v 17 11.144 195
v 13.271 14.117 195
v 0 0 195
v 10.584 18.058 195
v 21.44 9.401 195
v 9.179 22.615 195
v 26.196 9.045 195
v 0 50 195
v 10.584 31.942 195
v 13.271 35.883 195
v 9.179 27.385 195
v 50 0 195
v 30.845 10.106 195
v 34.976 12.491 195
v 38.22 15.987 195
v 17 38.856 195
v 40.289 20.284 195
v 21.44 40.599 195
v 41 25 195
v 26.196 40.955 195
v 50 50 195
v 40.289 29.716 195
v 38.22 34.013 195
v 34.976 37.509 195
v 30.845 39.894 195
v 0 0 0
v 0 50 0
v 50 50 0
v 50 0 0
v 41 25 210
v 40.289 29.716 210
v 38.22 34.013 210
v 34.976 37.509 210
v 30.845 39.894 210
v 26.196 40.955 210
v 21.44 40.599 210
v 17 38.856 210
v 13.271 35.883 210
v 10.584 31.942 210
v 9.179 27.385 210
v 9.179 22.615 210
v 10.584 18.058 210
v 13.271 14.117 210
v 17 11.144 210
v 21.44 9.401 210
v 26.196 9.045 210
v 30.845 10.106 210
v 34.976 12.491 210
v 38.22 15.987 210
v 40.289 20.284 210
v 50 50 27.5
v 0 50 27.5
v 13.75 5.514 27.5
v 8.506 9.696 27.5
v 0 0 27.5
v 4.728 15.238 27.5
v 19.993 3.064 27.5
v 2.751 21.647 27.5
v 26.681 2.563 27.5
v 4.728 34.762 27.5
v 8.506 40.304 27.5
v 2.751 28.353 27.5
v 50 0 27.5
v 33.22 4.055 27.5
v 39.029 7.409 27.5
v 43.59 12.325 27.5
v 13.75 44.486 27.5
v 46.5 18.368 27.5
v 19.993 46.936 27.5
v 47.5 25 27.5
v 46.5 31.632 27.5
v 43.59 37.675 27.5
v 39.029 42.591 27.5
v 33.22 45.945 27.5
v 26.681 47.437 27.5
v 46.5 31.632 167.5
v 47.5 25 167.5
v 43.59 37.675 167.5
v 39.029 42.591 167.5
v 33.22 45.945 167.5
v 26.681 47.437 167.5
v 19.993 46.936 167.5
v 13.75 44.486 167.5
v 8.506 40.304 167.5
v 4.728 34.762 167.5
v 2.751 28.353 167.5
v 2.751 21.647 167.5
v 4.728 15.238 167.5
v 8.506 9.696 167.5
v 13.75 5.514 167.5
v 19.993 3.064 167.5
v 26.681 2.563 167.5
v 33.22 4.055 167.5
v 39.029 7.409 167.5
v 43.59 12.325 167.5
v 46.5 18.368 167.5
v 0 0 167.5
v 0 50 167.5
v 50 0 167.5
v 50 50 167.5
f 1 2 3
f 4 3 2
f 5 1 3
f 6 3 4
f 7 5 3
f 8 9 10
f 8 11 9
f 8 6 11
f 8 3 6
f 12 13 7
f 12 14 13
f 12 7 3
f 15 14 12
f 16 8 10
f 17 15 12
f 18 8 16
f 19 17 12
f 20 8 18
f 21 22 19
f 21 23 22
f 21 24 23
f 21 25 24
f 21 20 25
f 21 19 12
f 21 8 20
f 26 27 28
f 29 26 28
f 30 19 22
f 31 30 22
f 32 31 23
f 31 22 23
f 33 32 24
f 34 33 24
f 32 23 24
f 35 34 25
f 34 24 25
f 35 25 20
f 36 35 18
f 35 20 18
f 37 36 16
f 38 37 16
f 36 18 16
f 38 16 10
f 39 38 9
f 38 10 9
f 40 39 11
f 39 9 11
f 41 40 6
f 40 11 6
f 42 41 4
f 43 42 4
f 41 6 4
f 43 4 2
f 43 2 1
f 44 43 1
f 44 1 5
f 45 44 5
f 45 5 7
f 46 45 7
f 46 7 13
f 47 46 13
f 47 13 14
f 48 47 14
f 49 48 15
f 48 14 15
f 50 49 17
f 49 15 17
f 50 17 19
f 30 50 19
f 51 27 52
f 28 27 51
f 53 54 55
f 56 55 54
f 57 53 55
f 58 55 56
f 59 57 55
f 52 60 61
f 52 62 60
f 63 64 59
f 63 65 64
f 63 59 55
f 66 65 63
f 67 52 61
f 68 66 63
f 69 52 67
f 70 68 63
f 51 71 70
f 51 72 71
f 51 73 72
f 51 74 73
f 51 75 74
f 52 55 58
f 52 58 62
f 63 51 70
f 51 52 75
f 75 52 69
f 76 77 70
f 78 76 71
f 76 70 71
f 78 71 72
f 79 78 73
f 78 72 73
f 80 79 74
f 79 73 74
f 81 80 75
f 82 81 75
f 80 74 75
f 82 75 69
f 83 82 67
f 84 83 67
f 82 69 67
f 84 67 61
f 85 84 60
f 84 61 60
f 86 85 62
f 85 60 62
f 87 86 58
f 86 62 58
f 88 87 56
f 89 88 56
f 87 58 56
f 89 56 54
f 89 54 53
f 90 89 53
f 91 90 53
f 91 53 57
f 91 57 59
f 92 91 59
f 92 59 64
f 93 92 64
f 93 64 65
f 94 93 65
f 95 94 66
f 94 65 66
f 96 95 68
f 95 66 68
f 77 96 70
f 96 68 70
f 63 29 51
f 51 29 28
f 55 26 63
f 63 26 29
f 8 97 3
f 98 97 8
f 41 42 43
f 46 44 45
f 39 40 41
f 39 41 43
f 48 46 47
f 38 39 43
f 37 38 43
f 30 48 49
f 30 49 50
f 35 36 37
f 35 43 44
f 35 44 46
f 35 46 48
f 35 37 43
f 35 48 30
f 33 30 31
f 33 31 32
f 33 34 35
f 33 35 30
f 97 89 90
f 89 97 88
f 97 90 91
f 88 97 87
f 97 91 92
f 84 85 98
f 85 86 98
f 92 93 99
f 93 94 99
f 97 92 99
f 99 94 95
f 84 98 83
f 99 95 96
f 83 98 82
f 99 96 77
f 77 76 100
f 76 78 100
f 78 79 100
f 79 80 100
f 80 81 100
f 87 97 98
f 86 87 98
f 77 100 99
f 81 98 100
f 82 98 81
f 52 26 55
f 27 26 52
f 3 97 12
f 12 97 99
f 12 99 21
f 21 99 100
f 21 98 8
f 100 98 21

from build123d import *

# Parameters (mm, degrees)
SKETCH1_W           = 50
SKETCH1_H           = 50
BOSS_EXTRUDE1_DEPTH = 27.5
SKETCH3_R           = 22.5
BOSS_EXTRUDE2_DEPTH = 140
SKETCH4_W           = 50
SKETCH4_H           = 50
BOSS_EXTRUDE3_DEPTH = 27.5
SKETCH5_R           = 16
BOSS_EXTRUDE4_DEPTH = 15


with BuildPart() as part:
    # Sketch1 → Boss-Extrude1 (new body)
    with BuildSketch(Plane.XY):
        with Locations((25, 25)):
            Rectangle(SKETCH1_W, SKETCH1_H)
    extrude(amount=BOSS_EXTRUDE1_DEPTH)

    # Sketch3 → Boss-Extrude2 (add)
    with BuildSketch(Plane.XY.offset(27.5)):
        with Locations((25, 25)):
            Circle(SKETCH3_R)
    extrude(amount=BOSS_EXTRUDE2_DEPTH)

    # Sketch4 → Boss-Extrude3 (add)
    with BuildSketch(Plane.XY.offset(167.5)):
        with Locations((25, 25)):
            Rectangle(SKETCH4_W, SKETCH4_H)
    extrude(amount=BOSS_EXTRUDE3_DEPTH)

    # Sketch5 → Boss-Extrude4 (add)
    with BuildSketch(Plane.XY.offset(195)):
        with Locations((25, 25)):
            Circle(SKETCH5_R)
    extrude(amount=BOSS_EXTRUDE4_DEPTH)


solid = part.part
